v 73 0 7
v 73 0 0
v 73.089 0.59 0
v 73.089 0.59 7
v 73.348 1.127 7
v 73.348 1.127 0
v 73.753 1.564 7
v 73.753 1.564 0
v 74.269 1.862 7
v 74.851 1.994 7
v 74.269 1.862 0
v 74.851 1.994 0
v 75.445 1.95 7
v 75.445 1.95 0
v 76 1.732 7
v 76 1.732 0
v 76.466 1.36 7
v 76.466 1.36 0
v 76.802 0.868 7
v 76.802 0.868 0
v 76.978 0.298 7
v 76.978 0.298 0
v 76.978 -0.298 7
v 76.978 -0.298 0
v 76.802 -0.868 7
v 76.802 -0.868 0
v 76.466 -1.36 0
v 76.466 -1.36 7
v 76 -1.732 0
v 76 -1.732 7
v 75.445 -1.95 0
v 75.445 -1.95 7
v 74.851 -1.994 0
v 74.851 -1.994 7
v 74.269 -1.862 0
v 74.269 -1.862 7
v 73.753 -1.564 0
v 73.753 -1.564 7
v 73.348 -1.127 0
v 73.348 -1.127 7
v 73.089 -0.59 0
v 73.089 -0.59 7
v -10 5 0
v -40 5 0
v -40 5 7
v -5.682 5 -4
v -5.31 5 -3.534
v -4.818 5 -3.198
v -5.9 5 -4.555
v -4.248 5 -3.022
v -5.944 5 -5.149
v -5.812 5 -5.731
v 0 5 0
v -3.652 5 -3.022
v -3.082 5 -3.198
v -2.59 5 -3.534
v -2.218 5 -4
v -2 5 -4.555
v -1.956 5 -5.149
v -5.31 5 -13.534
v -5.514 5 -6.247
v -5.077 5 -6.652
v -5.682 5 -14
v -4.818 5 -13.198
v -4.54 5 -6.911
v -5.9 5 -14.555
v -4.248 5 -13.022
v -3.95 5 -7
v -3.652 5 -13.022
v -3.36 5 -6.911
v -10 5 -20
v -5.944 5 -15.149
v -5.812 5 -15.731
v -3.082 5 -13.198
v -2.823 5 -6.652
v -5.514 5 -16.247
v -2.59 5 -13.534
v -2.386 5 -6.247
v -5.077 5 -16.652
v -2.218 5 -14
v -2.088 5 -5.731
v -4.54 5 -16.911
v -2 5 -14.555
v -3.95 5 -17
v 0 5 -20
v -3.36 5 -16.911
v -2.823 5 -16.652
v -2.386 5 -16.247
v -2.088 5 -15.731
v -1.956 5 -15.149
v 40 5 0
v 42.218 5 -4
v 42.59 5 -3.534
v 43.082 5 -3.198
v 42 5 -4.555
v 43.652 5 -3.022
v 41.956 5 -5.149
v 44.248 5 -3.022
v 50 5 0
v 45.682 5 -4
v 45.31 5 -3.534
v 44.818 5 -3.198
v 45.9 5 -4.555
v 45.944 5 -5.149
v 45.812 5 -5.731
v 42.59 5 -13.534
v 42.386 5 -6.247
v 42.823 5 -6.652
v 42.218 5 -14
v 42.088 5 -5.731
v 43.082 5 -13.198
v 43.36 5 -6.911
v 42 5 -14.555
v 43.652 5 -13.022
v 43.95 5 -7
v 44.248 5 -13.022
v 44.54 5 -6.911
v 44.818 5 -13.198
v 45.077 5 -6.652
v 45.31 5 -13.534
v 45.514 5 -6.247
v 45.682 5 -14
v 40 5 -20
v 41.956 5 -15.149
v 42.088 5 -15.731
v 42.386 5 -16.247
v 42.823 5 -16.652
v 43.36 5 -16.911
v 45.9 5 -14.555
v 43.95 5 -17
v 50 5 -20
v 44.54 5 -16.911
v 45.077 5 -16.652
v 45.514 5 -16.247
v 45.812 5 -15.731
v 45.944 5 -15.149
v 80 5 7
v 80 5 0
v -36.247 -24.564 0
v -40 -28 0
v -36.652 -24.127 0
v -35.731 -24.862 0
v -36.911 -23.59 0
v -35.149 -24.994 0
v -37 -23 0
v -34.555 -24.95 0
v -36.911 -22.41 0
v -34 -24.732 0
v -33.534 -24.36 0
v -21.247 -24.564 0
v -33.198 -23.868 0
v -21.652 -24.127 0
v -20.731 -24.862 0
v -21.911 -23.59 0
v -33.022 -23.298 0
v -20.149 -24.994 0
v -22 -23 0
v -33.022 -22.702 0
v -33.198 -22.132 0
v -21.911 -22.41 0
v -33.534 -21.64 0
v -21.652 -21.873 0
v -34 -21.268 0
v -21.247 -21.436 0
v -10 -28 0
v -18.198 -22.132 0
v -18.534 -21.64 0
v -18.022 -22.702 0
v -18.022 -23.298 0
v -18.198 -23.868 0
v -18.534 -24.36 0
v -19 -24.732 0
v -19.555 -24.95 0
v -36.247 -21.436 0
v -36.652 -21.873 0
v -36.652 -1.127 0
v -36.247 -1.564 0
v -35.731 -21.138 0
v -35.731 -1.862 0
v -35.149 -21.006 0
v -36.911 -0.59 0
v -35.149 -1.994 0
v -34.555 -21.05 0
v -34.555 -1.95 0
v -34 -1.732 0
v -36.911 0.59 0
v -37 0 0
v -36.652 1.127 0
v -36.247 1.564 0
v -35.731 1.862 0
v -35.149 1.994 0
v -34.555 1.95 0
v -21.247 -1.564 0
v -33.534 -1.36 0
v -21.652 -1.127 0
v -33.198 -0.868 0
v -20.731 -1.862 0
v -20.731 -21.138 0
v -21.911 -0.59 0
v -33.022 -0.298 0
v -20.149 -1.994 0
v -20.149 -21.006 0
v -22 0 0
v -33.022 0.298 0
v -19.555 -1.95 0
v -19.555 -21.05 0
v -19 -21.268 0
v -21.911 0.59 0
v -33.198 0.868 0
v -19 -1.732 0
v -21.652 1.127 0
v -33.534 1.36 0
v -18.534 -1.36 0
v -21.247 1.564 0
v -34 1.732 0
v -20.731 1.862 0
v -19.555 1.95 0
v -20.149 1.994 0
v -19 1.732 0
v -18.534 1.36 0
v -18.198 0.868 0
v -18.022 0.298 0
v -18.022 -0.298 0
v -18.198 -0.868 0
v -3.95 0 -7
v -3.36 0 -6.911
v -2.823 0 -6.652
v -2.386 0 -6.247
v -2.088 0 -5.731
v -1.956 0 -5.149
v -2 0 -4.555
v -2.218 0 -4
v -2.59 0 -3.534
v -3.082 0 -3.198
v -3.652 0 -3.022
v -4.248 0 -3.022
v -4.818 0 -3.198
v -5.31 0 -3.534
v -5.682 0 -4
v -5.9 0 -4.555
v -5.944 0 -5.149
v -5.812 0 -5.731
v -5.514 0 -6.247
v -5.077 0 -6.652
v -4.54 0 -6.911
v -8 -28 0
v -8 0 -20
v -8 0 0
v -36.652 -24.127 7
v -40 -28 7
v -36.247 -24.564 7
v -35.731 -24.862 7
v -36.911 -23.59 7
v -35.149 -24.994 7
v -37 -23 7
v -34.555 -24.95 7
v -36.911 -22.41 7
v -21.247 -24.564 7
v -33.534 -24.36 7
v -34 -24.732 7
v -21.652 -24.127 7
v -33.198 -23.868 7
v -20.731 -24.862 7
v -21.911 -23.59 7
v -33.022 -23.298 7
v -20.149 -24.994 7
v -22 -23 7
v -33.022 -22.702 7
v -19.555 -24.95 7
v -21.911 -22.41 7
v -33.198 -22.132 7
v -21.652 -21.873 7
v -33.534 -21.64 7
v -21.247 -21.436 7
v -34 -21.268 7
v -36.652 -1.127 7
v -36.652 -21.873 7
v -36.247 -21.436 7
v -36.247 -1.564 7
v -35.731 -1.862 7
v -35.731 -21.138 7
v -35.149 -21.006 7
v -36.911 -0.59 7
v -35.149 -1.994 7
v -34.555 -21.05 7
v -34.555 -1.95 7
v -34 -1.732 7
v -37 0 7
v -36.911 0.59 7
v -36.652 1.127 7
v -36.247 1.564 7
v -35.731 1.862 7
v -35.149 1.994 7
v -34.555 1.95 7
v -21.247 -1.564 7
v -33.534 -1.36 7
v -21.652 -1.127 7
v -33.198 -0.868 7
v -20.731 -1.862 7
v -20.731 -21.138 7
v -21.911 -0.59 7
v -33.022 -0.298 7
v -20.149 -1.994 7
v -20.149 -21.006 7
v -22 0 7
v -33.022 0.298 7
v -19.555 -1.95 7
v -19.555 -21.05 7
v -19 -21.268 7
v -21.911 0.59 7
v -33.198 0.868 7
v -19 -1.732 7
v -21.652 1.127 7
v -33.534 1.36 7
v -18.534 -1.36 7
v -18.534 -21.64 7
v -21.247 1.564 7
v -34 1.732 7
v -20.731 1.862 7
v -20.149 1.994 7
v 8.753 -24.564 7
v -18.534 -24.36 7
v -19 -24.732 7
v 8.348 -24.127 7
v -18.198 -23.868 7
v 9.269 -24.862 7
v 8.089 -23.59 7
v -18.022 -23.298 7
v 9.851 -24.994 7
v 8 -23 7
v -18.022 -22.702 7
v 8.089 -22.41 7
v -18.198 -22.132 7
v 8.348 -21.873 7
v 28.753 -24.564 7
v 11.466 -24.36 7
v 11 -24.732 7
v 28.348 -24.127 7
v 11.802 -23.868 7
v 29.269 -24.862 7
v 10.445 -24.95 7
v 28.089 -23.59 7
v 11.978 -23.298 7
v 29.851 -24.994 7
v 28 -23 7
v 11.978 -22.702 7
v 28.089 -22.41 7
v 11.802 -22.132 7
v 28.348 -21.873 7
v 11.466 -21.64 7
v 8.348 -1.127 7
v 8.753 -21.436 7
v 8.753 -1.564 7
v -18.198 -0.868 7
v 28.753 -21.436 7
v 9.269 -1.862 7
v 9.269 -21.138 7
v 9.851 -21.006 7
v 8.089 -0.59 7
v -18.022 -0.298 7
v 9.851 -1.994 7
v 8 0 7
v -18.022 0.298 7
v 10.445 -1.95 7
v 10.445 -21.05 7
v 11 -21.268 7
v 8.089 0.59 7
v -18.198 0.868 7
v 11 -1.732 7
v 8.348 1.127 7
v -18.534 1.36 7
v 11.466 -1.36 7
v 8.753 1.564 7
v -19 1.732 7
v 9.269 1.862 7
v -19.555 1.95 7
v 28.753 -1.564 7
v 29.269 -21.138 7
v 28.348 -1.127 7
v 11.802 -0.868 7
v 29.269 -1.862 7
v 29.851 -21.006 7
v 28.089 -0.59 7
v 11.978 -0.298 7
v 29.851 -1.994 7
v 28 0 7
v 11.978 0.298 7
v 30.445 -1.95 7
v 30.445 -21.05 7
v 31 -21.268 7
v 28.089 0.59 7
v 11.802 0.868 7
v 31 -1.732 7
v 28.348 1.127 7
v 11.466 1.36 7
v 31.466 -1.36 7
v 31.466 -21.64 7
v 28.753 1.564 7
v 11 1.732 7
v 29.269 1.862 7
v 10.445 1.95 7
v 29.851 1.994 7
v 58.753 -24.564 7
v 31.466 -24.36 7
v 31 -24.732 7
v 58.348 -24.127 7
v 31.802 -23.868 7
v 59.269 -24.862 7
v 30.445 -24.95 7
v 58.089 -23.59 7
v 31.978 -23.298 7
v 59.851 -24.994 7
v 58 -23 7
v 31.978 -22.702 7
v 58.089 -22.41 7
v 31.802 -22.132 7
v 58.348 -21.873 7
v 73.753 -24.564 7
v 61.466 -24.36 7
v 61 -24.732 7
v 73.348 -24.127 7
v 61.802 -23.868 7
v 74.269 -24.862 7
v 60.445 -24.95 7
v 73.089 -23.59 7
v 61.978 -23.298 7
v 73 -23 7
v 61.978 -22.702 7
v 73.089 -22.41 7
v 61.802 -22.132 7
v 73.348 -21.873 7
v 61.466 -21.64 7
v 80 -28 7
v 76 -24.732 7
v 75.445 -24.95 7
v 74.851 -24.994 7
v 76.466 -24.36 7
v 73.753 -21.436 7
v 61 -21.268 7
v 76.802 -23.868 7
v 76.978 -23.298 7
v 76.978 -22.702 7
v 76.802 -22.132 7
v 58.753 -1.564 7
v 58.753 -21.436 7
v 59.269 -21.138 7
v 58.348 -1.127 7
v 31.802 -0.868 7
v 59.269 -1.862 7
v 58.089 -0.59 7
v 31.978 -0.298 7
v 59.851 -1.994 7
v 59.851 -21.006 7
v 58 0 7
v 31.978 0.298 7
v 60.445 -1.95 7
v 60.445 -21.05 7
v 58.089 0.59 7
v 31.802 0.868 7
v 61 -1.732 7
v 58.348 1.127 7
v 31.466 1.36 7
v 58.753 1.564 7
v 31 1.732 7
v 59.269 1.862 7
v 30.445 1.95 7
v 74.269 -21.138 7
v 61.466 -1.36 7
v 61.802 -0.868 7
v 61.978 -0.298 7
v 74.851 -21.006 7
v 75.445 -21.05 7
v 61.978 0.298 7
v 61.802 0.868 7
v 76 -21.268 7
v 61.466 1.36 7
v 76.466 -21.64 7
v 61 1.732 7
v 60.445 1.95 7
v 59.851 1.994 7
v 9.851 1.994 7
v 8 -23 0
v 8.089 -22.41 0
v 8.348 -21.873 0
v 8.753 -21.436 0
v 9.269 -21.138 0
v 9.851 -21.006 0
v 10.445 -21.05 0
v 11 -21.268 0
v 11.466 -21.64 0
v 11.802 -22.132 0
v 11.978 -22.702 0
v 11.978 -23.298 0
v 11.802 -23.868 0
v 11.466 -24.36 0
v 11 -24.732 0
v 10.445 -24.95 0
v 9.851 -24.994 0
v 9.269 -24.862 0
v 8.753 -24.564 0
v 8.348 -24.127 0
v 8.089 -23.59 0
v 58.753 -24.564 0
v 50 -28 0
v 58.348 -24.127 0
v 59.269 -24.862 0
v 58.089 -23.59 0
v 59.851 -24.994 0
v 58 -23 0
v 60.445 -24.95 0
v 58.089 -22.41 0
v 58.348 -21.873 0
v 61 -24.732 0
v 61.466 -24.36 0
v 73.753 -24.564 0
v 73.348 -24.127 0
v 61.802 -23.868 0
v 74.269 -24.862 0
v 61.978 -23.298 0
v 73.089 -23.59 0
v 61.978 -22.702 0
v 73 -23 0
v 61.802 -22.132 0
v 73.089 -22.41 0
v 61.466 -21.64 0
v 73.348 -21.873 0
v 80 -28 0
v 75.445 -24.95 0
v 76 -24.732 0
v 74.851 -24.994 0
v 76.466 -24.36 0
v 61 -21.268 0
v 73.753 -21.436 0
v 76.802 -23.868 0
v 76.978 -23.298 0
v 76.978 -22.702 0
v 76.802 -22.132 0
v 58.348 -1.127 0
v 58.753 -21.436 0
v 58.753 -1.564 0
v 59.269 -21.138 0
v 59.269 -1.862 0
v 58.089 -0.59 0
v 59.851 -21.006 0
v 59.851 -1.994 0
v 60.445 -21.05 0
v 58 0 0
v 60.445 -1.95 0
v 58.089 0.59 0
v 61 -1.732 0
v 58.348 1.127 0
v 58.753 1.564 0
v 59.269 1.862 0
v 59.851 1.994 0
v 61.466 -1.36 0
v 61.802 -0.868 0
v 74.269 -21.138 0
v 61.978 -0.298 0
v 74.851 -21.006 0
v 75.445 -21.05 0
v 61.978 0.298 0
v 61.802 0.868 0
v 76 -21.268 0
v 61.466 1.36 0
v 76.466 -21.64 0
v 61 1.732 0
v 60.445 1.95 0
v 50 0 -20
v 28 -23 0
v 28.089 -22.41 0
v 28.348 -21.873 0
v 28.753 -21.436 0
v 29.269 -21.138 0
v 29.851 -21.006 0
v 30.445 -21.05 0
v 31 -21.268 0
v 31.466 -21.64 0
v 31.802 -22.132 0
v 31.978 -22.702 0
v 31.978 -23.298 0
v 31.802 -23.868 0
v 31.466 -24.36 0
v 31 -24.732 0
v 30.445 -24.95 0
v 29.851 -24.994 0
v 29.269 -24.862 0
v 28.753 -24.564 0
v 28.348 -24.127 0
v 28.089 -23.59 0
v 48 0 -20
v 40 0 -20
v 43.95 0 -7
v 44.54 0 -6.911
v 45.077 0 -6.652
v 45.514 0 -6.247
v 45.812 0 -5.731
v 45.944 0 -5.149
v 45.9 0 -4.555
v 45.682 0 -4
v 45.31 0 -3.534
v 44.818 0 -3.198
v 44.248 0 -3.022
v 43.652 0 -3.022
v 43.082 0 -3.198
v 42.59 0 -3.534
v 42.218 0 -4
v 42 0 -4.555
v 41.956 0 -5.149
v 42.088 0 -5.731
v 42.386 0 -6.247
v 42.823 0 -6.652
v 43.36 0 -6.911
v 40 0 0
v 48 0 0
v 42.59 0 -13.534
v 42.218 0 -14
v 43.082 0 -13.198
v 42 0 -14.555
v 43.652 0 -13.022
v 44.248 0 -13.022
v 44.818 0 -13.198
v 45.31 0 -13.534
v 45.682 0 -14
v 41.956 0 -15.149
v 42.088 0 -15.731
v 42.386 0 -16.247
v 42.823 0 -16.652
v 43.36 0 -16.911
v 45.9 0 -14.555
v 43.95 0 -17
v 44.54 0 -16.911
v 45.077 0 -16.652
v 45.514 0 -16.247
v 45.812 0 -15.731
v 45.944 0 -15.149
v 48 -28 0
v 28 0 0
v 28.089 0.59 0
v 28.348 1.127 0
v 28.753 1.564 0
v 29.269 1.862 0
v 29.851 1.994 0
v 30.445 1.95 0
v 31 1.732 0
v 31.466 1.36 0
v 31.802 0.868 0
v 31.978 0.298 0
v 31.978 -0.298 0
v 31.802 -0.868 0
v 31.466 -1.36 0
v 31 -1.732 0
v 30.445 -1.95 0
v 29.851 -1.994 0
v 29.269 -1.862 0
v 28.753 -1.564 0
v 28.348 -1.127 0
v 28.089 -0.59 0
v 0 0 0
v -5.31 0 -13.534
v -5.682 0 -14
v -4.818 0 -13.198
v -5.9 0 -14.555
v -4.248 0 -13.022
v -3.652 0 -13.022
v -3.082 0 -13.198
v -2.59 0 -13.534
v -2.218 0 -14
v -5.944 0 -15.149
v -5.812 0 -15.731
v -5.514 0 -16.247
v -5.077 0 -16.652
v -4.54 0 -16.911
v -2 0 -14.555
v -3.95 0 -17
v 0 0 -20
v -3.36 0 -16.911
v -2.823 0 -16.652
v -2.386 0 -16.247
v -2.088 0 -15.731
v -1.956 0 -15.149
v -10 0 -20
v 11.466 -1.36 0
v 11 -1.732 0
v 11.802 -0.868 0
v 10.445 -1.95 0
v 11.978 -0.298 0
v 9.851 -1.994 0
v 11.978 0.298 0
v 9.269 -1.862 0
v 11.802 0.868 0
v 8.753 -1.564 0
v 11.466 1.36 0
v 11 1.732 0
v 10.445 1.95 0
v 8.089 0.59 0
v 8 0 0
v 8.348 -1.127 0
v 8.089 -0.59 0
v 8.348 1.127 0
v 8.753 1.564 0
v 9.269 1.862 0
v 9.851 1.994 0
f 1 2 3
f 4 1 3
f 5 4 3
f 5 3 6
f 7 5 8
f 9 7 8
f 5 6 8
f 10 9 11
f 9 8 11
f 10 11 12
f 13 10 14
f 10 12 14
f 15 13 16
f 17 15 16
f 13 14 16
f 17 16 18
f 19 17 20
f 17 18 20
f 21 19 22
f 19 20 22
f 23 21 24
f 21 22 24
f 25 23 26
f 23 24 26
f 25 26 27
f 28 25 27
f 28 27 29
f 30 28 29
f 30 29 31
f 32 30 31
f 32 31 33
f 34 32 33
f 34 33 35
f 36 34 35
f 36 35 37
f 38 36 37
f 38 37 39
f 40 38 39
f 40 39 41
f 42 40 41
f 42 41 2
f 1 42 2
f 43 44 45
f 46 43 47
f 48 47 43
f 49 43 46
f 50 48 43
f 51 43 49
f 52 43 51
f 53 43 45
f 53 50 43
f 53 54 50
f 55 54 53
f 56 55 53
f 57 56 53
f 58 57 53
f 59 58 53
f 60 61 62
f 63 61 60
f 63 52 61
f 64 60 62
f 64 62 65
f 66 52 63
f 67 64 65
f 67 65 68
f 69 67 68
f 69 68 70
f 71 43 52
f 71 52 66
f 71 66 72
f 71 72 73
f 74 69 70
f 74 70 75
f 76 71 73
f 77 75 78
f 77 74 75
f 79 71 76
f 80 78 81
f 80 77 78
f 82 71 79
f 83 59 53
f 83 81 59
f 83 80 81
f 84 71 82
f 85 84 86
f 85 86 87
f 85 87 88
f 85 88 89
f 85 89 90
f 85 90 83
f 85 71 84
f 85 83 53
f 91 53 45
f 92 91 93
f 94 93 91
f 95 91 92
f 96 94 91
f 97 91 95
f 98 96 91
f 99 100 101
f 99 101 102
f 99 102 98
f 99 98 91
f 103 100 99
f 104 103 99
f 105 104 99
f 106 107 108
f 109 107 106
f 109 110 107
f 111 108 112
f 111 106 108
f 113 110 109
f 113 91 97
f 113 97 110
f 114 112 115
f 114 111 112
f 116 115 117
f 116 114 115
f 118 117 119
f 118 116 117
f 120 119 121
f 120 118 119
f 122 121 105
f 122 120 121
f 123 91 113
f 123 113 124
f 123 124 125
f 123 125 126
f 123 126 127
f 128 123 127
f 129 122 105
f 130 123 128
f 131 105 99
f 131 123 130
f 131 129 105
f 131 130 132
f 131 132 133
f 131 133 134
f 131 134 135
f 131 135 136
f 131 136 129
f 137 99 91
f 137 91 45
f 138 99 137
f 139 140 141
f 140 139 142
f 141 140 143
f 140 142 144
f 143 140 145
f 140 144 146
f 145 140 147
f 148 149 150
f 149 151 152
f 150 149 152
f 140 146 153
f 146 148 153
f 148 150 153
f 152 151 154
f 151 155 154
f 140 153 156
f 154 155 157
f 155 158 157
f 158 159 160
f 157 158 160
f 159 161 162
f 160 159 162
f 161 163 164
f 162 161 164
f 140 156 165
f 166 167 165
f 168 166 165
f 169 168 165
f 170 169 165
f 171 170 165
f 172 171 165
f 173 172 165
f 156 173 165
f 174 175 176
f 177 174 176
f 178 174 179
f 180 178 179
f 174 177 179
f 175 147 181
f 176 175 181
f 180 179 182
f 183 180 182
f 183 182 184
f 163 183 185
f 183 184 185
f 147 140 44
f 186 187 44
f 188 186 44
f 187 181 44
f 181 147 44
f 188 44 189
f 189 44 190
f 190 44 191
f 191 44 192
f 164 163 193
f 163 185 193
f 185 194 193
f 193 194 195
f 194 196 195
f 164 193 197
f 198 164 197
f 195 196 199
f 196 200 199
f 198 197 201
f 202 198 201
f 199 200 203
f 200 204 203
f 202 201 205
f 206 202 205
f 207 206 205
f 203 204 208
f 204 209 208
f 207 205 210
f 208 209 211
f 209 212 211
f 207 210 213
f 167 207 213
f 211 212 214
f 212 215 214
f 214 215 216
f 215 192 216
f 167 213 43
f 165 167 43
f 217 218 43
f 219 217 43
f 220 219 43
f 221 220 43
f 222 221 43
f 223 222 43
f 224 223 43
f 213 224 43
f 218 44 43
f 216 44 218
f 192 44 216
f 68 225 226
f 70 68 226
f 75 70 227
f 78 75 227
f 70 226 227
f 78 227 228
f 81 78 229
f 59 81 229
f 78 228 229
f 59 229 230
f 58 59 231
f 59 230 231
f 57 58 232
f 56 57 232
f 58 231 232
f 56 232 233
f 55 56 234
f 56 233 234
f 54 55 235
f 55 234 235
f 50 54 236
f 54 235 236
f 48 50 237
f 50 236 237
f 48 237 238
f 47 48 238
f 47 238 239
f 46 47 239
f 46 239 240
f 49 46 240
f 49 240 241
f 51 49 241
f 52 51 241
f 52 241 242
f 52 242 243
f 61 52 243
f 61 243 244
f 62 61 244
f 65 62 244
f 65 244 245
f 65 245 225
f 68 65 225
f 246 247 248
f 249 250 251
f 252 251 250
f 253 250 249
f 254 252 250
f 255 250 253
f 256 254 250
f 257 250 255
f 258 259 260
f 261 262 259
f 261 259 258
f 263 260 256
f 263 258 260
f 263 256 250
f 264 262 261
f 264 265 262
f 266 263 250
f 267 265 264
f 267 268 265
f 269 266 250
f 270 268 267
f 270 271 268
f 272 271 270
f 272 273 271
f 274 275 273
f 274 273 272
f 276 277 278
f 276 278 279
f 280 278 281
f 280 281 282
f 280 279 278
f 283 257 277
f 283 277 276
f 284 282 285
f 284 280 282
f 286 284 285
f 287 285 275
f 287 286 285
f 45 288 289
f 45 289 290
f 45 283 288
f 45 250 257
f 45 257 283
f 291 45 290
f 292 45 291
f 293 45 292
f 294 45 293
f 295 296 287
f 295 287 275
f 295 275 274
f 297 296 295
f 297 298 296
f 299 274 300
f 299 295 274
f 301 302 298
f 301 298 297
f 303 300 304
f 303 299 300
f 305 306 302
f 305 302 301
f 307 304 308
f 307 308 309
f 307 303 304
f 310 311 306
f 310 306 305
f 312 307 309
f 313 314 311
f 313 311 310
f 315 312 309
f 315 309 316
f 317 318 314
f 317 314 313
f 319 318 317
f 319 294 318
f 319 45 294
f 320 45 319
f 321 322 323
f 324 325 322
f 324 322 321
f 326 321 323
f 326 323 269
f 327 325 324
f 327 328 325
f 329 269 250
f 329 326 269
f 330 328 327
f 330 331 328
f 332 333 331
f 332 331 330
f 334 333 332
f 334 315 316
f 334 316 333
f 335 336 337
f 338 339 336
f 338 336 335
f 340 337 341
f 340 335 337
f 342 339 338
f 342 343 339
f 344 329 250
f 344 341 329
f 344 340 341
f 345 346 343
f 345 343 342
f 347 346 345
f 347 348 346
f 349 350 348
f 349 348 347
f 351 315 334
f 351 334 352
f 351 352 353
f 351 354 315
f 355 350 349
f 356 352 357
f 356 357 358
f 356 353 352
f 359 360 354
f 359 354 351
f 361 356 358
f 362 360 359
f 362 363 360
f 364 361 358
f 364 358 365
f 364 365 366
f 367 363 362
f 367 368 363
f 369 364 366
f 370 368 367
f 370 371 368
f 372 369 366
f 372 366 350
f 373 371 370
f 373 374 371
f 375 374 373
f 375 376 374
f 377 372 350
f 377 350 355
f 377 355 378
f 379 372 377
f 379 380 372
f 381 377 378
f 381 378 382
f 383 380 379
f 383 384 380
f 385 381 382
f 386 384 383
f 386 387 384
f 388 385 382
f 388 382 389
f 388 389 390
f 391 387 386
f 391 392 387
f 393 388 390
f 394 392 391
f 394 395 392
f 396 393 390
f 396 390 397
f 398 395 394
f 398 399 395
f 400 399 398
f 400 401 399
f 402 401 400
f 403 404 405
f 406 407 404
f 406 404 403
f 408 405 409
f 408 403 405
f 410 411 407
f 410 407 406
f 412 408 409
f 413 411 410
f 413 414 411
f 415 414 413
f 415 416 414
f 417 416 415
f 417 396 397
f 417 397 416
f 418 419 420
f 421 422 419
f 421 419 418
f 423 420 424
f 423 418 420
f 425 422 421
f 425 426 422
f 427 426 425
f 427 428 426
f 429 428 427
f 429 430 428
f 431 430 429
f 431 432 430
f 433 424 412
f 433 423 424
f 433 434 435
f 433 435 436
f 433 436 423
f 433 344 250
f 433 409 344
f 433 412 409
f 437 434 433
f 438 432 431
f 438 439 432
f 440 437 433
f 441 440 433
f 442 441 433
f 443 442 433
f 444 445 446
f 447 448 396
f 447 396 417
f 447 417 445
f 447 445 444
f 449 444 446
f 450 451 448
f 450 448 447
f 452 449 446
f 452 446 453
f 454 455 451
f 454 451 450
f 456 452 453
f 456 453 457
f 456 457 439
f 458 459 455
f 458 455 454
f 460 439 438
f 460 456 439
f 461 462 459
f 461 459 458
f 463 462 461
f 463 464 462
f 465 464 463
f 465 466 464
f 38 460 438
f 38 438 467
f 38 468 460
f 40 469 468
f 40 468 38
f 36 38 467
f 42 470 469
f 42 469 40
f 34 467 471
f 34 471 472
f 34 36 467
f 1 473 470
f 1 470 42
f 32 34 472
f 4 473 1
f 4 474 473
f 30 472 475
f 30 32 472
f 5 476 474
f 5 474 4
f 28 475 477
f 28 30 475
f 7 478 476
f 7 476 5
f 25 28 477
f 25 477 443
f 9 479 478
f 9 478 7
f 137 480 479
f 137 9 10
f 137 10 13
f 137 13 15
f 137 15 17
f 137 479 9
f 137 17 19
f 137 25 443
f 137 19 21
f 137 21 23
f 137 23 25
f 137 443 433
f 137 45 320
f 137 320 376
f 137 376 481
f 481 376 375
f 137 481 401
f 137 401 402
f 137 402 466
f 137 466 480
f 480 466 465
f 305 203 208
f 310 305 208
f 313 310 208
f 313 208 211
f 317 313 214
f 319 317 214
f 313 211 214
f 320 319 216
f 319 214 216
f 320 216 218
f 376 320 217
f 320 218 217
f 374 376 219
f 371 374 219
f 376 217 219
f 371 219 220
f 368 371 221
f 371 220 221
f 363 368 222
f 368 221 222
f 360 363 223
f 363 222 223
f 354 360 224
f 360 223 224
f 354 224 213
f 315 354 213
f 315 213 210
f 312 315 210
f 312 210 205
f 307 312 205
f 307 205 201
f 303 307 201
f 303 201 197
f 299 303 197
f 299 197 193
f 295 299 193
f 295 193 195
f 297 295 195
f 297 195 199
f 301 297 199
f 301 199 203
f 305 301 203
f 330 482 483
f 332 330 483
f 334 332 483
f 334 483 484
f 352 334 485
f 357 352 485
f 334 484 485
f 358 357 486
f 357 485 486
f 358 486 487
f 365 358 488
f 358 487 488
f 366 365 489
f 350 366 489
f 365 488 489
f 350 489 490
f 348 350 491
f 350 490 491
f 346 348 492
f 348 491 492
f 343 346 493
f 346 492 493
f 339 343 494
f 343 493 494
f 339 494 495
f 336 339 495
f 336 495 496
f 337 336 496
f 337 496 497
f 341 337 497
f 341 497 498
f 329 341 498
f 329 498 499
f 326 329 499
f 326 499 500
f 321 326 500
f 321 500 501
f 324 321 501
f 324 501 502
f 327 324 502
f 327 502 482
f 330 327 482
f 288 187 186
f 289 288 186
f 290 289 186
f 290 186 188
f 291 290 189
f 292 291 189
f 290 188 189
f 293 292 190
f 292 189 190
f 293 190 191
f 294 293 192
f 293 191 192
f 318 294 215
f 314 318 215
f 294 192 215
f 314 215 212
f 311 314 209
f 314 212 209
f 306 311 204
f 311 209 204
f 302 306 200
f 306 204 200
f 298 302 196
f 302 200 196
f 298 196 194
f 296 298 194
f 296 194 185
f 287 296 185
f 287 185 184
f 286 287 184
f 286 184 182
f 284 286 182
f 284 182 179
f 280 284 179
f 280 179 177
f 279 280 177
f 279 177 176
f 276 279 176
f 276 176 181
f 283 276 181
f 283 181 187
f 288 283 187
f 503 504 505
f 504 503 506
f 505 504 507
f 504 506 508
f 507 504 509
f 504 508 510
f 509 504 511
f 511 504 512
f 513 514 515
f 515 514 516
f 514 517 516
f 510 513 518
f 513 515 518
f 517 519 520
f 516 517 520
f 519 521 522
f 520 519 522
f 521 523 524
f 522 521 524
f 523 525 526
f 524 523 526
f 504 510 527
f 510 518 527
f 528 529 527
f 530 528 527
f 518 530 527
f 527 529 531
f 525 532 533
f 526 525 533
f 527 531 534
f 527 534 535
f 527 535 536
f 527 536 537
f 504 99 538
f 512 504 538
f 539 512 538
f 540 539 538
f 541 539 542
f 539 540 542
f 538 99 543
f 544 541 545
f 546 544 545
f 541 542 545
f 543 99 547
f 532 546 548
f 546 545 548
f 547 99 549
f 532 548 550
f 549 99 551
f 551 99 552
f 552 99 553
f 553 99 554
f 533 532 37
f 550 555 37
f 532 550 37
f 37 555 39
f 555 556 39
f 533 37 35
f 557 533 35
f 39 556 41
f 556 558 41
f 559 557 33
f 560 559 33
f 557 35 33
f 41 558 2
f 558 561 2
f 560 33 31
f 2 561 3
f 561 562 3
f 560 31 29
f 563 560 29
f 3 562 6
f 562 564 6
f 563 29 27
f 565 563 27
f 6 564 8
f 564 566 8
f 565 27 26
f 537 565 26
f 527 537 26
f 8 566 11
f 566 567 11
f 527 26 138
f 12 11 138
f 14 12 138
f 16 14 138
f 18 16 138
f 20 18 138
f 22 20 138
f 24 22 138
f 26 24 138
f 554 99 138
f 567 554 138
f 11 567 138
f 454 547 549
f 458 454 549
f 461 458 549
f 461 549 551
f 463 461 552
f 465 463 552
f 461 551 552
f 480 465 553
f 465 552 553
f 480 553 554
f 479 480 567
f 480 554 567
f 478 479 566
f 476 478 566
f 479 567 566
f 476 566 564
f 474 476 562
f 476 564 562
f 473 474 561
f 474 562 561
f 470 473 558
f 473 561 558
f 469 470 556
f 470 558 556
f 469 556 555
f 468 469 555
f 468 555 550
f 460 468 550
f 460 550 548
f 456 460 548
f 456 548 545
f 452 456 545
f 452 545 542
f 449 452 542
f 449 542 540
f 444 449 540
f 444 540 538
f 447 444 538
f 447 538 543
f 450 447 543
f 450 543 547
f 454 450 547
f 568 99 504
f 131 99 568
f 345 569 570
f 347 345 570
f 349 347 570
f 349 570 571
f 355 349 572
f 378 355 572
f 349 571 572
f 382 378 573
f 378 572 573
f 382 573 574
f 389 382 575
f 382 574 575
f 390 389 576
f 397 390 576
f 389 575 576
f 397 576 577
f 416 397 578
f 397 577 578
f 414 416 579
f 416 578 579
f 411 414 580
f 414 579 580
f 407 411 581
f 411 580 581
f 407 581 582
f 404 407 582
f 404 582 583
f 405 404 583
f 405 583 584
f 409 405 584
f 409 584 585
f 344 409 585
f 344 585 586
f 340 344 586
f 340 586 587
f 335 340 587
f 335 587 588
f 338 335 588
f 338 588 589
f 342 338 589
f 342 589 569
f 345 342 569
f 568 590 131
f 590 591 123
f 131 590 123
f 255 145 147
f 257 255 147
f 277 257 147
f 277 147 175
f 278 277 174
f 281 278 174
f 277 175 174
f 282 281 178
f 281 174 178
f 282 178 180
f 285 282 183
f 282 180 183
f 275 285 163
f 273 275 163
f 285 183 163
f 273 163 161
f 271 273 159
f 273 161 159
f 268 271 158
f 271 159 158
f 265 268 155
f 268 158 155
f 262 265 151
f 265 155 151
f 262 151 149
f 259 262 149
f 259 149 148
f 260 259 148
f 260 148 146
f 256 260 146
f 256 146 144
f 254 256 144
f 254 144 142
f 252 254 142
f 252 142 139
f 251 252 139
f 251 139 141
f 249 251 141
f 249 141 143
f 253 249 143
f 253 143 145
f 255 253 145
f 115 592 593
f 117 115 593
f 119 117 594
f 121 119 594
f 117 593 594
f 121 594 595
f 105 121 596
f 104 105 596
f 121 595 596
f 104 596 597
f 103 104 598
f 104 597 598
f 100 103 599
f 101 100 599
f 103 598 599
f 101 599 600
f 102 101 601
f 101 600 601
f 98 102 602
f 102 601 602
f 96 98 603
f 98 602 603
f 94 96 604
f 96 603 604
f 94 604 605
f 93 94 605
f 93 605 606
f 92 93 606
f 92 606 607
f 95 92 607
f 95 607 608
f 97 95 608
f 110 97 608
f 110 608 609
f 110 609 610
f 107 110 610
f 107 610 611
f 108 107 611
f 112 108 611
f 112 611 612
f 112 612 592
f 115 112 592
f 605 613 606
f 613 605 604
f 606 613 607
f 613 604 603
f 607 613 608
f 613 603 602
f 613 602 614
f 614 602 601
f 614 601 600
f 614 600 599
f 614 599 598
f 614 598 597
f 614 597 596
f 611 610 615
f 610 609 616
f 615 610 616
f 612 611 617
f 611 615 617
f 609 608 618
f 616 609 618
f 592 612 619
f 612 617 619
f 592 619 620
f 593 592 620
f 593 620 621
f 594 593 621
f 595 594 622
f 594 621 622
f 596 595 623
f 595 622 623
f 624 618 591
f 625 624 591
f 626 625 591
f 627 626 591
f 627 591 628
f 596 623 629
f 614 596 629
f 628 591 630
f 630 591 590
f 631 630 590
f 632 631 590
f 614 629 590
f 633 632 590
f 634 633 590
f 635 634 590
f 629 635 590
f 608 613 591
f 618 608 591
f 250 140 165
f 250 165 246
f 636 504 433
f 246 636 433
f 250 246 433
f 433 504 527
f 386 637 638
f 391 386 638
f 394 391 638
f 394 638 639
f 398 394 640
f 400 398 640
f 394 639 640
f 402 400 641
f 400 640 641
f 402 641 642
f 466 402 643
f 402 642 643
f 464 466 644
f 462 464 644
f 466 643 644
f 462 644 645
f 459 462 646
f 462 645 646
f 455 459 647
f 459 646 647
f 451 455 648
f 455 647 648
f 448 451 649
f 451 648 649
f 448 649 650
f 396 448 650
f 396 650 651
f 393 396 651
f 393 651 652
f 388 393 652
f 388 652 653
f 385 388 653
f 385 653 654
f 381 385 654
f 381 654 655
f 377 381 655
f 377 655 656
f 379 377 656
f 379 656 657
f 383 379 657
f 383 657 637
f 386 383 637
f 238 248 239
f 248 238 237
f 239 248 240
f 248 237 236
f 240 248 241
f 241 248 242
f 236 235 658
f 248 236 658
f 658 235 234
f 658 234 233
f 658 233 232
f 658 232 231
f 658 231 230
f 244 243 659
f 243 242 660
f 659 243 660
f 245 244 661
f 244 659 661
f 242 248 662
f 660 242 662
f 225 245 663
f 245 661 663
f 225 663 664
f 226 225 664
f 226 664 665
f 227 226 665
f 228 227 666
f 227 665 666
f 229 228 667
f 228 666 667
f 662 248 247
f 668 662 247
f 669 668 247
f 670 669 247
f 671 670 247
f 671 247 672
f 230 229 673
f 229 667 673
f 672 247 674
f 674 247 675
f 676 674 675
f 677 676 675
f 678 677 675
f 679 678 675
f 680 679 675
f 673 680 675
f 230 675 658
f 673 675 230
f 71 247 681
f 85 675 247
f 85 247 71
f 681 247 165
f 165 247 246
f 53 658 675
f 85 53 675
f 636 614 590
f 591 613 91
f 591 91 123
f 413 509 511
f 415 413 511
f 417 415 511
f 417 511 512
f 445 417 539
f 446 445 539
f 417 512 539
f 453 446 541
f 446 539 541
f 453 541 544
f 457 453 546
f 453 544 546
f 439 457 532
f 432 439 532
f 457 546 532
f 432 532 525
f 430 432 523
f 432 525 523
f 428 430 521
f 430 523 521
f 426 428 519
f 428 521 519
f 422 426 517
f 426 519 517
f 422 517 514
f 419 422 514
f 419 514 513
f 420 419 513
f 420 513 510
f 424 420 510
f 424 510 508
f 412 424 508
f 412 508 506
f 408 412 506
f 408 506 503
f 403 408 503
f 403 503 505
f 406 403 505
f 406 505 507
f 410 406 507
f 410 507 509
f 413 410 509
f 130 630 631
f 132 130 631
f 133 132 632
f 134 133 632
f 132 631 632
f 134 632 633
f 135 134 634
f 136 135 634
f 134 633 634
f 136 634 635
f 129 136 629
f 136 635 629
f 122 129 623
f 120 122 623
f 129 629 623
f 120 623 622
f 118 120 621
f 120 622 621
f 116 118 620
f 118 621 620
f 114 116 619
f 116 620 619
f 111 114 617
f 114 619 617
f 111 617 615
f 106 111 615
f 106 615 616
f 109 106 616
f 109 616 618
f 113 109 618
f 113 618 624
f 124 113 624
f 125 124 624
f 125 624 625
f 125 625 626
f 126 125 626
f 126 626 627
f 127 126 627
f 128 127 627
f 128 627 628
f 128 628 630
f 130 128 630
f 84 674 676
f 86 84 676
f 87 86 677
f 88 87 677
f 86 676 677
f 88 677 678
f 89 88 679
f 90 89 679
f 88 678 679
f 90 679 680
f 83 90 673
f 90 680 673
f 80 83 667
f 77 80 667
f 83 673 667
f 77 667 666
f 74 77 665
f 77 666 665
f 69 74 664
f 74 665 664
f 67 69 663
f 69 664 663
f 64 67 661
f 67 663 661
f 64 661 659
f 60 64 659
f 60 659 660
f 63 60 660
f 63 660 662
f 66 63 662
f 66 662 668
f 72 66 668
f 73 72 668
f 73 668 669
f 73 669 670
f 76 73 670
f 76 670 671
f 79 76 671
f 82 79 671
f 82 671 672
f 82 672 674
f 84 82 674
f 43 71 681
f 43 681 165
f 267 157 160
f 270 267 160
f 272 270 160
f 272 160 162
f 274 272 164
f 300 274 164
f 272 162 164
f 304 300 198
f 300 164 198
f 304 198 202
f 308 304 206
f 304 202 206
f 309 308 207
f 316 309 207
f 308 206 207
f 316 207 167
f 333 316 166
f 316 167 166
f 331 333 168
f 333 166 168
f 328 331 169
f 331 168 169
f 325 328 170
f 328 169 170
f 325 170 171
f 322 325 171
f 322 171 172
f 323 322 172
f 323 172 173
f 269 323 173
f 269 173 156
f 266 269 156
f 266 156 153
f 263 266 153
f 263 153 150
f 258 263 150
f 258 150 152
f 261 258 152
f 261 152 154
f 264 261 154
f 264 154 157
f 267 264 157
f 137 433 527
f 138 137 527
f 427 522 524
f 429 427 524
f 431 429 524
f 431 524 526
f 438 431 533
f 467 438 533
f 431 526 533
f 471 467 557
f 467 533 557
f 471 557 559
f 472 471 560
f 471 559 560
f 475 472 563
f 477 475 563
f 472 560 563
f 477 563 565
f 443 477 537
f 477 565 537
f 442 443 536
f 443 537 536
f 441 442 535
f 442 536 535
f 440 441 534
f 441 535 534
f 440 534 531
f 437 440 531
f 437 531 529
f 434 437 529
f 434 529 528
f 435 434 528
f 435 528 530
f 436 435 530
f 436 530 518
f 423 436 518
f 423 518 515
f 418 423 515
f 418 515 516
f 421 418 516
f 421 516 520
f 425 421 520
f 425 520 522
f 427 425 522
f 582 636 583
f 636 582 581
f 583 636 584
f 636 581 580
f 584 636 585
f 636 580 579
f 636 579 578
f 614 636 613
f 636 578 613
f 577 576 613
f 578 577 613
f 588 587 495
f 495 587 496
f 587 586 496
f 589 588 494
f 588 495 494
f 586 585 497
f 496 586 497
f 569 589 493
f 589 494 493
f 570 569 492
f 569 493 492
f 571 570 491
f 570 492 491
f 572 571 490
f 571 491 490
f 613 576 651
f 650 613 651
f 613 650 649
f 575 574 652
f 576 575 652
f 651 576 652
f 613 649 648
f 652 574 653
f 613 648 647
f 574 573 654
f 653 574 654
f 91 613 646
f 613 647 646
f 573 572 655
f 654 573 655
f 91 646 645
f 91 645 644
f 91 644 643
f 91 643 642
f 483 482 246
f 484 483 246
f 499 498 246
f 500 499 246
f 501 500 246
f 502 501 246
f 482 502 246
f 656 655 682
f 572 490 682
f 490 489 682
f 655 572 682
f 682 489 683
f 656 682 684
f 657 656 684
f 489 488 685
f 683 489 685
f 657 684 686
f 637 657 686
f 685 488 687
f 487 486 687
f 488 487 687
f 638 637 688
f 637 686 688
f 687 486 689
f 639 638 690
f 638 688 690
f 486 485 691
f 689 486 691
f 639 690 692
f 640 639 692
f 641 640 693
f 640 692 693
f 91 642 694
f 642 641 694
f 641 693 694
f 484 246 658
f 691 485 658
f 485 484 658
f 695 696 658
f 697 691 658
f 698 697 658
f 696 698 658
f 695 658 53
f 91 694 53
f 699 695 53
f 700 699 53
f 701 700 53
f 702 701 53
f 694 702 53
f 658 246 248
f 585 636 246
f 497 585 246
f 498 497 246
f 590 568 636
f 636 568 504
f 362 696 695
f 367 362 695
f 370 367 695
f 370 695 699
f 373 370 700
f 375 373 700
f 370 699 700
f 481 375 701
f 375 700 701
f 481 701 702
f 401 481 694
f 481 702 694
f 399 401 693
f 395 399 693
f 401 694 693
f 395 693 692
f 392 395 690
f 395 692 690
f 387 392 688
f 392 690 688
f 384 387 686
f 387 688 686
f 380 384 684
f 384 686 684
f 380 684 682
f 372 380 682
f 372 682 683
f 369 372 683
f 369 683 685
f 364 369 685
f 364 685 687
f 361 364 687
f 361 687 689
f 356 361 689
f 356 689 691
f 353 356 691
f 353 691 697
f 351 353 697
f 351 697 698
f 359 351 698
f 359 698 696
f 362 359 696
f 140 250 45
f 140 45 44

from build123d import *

# Parameters (mm, degrees)
SKETCH2_W               = 8
SKETCH2_H               = 20
SKETCH2_W_2             = 11.75
SKETCH2_H_2             = 12.66
BOSS_EXTRUDE1_DEPTH     = 5
SKETCH3_W               = 13.1
SKETCH3_H               = 7
BOSS_EXTRUDE2_DEPTH     = 28
SKETCH4_W               = 5.75
SKETCH4_H               = 12.66
CUT_EXTRUDE1_DEPTH      = 62.587336361
SKETCH5_R               = 2
CUT_EXTRUDE2_DEPTH      = 61.902073035
SKETCH6_R               = 2
CUT_EXTRUDE3_DEPTH      = 60.059292241
SKETCH7_W               = 7
SKETCH7_H               = 28
BOSS_EXTRUDE3_DEPTH     = 19.4
SKETCH8_W               = 27
SKETCH8_H               = 33
BOSS_EXTRUDE4_DEPTH     = 2
SKETCH9_W               = 27
SKETCH9_H               = 33
BOSS_EXTRUDE5_DEPTH     = 2
CUT_EXTRUDE4_DEPTH      = 68.4388612
CUT_EXTRUDE4_DEPTH_BACK = 68.4388612
SKETCH12_W              = 12.66
SKETCH12_H              = 33
CUT_EXTRUDE5_DEPTH      = 63.562468781
SKETCH13_W              = 30
SKETCH13_H              = 7
BOSS_EXTRUDE6_DEPTH     = 33
SKETCH14_R              = 2
CUT_EXTRUDE6_DEPTH      = 88.086164228


with BuildPart() as part:
    # Sketch2 → Boss-Extrude1 (new body)
    with BuildSketch(Plane(origin=(0, 0, 0), x_dir=(1, 0, 0), z_dir=(0, 1, 0))):
        with Locations((-4, 10)):
            Rectangle(SKETCH2_W, SKETCH2_H)
        Polygon((40, 0), (0, 0), (-8, 0), (-8, -7), (3.75, -7), (16.85, -7), (28.6, -7), (48, -7), (48, 0), align=None)
        with Locations((-2.125, -13.33)):
            Rectangle(SKETCH2_W_2, SKETCH2_H_2)
        with Locations((22.725, -13.33)):
            Rectangle(SKETCH2_W_2, SKETCH2_H_2)
        with Locations((44, 10)):
            Rectangle(SKETCH2_W, SKETCH2_H)
    extrude(amount=BOSS_EXTRUDE1_DEPTH)

    # Sketch3 → Boss-Extrude2 (add)
    with BuildSketch(Plane.XZ):
        Polygon((3.75, 19.66), (-8, 19.66), (-8, 0), (0, 0), (3.75, 0), (3.75, 7), align=None)
        with Locations((10.3, 3.5)):
            Rectangle(SKETCH3_W, SKETCH3_H)
        Polygon((16.85, 19.66), (16.85, 7), (16.85, 0), (28.6, 0), (28.6, 7), (28.6, 19.66), align=None)
    extrude(amount=BOSS_EXTRUDE2_DEPTH)

    # Sketch4 → Cut-Extrude1 (cut, through all)
    with BuildSketch(Plane.XZ.offset(28)):
        with Locations((-5.125, 13.33)):
            Rectangle(SKETCH4_W, SKETCH4_H)
        with Locations((25.725, 13.33)):
            Rectangle(SKETCH4_W, SKETCH4_H)
    extrude(amount=-CUT_EXTRUDE1_DEPTH, mode=Mode.SUBTRACT)

    # Sketch5 → Cut-Extrude2 (cut, through all)
    with BuildSketch(Plane.ZY.offset(2.25)):
        with Locations((13.33, -2)):
            Circle(SKETCH5_R)
        with Locations((13.33, -21)):
            Circle(SKETCH5_R)
        with Locations((13.33, -11.5)):
            Circle(SKETCH5_R)
    extrude(amount=-CUT_EXTRUDE2_DEPTH, mode=Mode.SUBTRACT)

    # Sketch6 → Cut-Extrude3 (cut, through all)
    with BuildSketch(Plane.XZ):
        with Locations(Location((43.95, -5, 0), (0, 0, 270))):
            Circle(SKETCH6_R)
        with Locations(Location((43.95, -15, 0), (0, 0, 270))):
            Circle(SKETCH6_R)
        with Locations(Location((-3.95, -5, 0), (0, 0, 270))):
            Circle(SKETCH6_R)
        with Locations(Location((-3.95, -15, 0), (0, 0, 270))):
            Circle(SKETCH6_R)
    extrude(amount=-CUT_EXTRUDE3_DEPTH, mode=Mode.SUBTRACT)

    # Sketch7 → Boss-Extrude3 (add)
    with BuildSketch(Plane(origin=(28.6, 0, 0), x_dir=(0, 0, -1), z_dir=(1, 0, 0))):
        with Locations((-3.5, -14)):
            Rectangle(SKETCH7_W, SKETCH7_H)
    extrude(amount=BOSS_EXTRUDE3_DEPTH)

    # Sketch8 → Boss-Extrude4 (add)
    with BuildSketch(Plane(origin=(48, 0, 0), x_dir=(0, 0, -1), z_dir=(1, 0, 0))):
        with Locations((6.5, -11.5)):
            Rectangle(SKETCH8_W, SKETCH8_H)
    extrude(amount=BOSS_EXTRUDE4_DEPTH)

    # Sketch9 → Boss-Extrude5 (add)
    with BuildSketch(Plane.ZY.offset(8)):
        with Locations((-6.5, -11.5)):
            Rectangle(SKETCH9_W, SKETCH9_H)
    extrude(amount=BOSS_EXTRUDE5_DEPTH)

    # Sketch10 → Cut-Extrude4 (cut, two sides: drawn at the far end of the back side and taken through both)
    with BuildSketch(Plane.ZY.offset(-48).offset(-CUT_EXTRUDE4_DEPTH_BACK)):
        Polygon((-20, 0), (0, -28), (-20, -28), align=None)
    extrude(amount=CUT_EXTRUDE4_DEPTH + CUT_EXTRUDE4_DEPTH_BACK, mode=Mode.SUBTRACT)

    # Sketch12 → Cut-Extrude5 (cut, through all)
    with BuildSketch(Plane.ZY.offset(2.25)):
        with Locations((13.33, -11.5)):
            Rectangle(SKETCH12_W, SKETCH12_H)
    extrude(amount=-CUT_EXTRUDE5_DEPTH, mode=Mode.SUBTRACT)

    # Sketch13 → Boss-Extrude6 (add)
    with BuildSketch(Plane(origin=(0, 5, 0), x_dir=(1, 0, 0), z_dir=(0, 1, 0))):
        with Locations((-25, -3.5)):
            Rectangle(SKETCH13_W, SKETCH13_H)
        with Locations((65, -3.5)):
            Rectangle(SKETCH13_W, SKETCH13_H)
    extrude(amount=-BOSS_EXTRUDE6_DEPTH)

    # Sketch14 → Cut-Extrude6 (cut, through all)
    with BuildSketch(Plane(origin=(0, 0, 0), x_dir=(-1, 0, 0), z_dir=(0, 0, -1))):
        with Locations((35, -23)):
            Circle(SKETCH14_R)
        with Locations((20, -23)):
            Circle(SKETCH14_R)
        with Locations((20, 0)):
            Circle(SKETCH14_R)
        with Locations((35, 0)):
            Circle(SKETCH14_R)
        with Locations((-10, 0)):
            Circle(SKETCH14_R)
        with Locations((-10, -23)):
            Circle(SKETCH14_R)
        with Locations((-30, -23)):
            Circle(SKETCH14_R)
        with Locations((-30, 0)):
            Circle(SKETCH14_R)
        with Locations((-60, 0)):
            Circle(SKETCH14_R)
        with Locations((-60, -23)):
            Circle(SKETCH14_R)
        with Locations((-75, -23)):
            Circle(SKETCH14_R)
        with Locations((-75, 0)):
            Circle(SKETCH14_R)
    extrude(amount=-CUT_EXTRUDE6_DEPTH, mode=Mode.SUBTRACT)


solid = part.part
